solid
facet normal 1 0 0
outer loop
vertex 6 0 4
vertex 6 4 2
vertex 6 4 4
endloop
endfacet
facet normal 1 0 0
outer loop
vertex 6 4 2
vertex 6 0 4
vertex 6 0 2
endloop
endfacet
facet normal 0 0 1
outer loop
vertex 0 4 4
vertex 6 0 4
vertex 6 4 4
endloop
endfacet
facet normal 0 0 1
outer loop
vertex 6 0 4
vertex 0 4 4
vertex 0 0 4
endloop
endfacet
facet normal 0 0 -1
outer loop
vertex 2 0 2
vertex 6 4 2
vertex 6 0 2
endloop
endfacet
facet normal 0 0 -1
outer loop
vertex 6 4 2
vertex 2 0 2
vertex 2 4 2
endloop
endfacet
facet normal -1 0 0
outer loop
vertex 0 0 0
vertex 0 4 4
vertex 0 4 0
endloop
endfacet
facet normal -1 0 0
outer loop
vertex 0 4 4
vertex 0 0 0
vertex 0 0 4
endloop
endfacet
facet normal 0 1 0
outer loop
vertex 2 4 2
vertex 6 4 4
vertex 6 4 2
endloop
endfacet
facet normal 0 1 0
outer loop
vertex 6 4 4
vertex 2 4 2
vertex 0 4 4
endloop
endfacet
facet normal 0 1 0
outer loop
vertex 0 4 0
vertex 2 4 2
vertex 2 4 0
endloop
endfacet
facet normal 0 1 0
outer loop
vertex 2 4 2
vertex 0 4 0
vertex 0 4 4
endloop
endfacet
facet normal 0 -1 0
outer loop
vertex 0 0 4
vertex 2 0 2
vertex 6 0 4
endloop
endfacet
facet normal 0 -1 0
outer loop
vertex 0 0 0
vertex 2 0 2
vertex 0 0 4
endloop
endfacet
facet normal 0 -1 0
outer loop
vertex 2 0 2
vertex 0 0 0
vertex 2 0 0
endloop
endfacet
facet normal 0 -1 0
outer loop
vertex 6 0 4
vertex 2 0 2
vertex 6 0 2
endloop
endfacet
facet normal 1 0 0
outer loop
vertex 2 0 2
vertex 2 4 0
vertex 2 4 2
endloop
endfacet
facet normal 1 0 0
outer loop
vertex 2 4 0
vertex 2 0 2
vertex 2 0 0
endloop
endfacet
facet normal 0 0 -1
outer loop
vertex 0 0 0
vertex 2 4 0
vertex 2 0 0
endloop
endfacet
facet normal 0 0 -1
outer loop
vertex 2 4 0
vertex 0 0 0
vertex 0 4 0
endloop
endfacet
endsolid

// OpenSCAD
bx = 4;
bz = 2;

x = 2;
y = 4;
z = 2;

// bridge
translate([0, 0, z])
  cube([x + bx, y, z]);
// leg
cube([x, y, z]);
